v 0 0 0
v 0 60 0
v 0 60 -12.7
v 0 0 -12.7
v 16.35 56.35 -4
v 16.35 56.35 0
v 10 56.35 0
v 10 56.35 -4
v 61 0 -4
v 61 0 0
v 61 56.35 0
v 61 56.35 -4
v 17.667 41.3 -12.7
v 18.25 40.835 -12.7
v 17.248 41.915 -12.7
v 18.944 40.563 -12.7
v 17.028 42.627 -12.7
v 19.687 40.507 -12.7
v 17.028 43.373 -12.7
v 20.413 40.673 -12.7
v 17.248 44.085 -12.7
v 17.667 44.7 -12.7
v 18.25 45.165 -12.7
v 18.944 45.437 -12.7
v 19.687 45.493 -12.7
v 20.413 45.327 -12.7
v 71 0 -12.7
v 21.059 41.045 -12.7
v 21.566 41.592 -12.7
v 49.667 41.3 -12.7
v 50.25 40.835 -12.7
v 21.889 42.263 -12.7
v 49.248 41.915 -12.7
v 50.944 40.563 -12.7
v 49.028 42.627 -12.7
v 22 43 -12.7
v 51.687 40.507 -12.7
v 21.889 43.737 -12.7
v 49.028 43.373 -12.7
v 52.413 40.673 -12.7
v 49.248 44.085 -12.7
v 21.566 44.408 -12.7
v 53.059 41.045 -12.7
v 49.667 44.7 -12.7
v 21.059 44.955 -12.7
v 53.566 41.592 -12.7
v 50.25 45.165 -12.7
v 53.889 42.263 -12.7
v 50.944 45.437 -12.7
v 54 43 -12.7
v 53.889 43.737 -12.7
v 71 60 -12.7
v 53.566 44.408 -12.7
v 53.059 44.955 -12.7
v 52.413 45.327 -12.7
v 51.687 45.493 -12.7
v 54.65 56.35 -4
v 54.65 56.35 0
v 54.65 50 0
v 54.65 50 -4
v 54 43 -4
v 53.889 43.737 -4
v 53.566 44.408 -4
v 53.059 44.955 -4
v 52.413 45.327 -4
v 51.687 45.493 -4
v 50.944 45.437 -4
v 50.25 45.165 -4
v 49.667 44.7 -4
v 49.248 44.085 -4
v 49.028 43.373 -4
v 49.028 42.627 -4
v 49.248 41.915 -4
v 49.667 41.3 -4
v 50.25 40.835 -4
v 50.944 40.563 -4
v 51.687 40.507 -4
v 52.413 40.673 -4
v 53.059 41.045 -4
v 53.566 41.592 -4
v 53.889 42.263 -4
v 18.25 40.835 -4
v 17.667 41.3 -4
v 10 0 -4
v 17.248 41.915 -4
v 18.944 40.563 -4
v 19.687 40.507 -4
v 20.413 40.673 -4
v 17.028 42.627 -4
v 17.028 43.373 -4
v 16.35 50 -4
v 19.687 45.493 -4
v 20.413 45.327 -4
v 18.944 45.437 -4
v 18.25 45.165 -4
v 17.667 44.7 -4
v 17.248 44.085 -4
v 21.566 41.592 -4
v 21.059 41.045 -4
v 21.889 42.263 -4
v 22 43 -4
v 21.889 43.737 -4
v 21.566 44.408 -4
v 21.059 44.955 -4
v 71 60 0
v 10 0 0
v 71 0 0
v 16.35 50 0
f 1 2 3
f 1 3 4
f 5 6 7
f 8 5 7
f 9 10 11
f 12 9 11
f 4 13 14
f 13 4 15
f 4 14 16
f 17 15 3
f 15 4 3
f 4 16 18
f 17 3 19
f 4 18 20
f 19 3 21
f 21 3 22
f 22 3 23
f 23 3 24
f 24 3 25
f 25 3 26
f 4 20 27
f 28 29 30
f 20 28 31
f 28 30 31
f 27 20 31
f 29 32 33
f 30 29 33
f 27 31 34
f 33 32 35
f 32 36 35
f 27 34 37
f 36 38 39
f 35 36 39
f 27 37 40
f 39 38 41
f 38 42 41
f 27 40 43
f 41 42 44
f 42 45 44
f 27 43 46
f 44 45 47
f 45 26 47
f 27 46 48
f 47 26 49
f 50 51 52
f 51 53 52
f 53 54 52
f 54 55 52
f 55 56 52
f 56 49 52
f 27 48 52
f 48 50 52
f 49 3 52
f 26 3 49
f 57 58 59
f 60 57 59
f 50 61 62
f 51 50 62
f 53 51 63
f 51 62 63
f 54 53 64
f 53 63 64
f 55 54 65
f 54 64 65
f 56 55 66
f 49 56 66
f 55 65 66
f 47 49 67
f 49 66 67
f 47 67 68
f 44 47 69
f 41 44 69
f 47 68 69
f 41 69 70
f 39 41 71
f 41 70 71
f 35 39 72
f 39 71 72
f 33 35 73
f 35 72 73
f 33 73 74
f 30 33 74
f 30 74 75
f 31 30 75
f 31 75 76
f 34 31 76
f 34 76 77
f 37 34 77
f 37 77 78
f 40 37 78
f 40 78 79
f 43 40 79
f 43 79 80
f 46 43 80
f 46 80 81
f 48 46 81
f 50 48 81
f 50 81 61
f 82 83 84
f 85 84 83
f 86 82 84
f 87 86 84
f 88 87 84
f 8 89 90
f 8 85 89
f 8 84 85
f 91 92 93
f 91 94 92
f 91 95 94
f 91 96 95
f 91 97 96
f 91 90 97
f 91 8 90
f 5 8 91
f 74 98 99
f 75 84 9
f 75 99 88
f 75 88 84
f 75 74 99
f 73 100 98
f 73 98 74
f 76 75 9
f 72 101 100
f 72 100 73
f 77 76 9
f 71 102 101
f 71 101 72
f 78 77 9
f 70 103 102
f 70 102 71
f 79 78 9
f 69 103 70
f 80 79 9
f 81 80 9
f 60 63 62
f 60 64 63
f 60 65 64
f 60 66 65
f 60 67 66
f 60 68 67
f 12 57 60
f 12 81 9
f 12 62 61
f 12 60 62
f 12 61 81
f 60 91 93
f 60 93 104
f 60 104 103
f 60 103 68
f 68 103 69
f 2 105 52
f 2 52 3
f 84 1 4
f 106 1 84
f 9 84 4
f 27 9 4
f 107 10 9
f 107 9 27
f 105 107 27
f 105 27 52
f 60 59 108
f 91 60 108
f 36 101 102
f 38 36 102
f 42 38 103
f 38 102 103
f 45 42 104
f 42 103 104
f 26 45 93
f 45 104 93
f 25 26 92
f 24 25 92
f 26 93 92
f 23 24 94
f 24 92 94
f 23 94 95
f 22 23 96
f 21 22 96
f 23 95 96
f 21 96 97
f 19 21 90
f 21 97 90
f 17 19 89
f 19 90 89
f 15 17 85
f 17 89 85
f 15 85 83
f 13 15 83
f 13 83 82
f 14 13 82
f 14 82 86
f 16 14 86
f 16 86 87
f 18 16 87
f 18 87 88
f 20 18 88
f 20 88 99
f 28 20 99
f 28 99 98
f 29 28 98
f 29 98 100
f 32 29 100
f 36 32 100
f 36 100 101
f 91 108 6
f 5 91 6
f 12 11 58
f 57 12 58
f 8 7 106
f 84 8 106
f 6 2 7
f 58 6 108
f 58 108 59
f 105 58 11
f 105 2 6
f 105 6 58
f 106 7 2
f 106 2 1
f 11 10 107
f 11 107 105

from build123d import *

# Parameters (mm, degrees)
F0_R     = 2.5
F1_DEPTH = 12.7
F2_DEPTH = 4


# Not quite as in the source:
# - a length typed as a fraction of an inch, garbled in the dataset ("3 / 203.2 mm" for 3/8 in), is restored
# - a feature names something its author has since deleted; it is built from what else it names


with BuildPart() as f1:
    # F0 (on Top) → F1 (new body)
    with BuildSketch(Plane.XY):
        Polygon((0, 60), (0, 0), (10, 0), (10, 50), (10, 56.35), (16.35, 56.35), (16.35, 50), (54.65, 50), (54.65, 56.35), (61, 56.35), (61, 50), (61, 0), (71, 0), (71, 60), align=None)
        Polygon((10, 50), (10, 0), (61, 0), (61, 50), (61, 56.35), (54.65, 56.35), (54.65, 50), (16.35, 50), (16.35, 56.35), (10, 56.35), align=None)
        with Locations((19.5, 43)):
            Circle(F0_R, mode=Mode.SUBTRACT)
        with Locations((51.5, 43)):
            Circle(F0_R, mode=Mode.SUBTRACT)
    extrude(amount=-F1_DEPTH)

    # F0 (on Top) → F2 (cut)
    with BuildSketch(Plane.XY):
        Polygon((10, 50), (10, 0), (61, 0), (61, 50), (61, 56.35), (54.65, 56.35), (54.65, 50), (16.35, 50), (16.35, 56.35), (10, 56.35), align=None)
        with Locations((19.5, 43)):
            Circle(F0_R, mode=Mode.SUBTRACT)
        with Locations((51.5, 43)):
            Circle(F0_R, mode=Mode.SUBTRACT)
    extrude(amount=-F2_DEPTH, mode=Mode.SUBTRACT)


solid = f1.part
